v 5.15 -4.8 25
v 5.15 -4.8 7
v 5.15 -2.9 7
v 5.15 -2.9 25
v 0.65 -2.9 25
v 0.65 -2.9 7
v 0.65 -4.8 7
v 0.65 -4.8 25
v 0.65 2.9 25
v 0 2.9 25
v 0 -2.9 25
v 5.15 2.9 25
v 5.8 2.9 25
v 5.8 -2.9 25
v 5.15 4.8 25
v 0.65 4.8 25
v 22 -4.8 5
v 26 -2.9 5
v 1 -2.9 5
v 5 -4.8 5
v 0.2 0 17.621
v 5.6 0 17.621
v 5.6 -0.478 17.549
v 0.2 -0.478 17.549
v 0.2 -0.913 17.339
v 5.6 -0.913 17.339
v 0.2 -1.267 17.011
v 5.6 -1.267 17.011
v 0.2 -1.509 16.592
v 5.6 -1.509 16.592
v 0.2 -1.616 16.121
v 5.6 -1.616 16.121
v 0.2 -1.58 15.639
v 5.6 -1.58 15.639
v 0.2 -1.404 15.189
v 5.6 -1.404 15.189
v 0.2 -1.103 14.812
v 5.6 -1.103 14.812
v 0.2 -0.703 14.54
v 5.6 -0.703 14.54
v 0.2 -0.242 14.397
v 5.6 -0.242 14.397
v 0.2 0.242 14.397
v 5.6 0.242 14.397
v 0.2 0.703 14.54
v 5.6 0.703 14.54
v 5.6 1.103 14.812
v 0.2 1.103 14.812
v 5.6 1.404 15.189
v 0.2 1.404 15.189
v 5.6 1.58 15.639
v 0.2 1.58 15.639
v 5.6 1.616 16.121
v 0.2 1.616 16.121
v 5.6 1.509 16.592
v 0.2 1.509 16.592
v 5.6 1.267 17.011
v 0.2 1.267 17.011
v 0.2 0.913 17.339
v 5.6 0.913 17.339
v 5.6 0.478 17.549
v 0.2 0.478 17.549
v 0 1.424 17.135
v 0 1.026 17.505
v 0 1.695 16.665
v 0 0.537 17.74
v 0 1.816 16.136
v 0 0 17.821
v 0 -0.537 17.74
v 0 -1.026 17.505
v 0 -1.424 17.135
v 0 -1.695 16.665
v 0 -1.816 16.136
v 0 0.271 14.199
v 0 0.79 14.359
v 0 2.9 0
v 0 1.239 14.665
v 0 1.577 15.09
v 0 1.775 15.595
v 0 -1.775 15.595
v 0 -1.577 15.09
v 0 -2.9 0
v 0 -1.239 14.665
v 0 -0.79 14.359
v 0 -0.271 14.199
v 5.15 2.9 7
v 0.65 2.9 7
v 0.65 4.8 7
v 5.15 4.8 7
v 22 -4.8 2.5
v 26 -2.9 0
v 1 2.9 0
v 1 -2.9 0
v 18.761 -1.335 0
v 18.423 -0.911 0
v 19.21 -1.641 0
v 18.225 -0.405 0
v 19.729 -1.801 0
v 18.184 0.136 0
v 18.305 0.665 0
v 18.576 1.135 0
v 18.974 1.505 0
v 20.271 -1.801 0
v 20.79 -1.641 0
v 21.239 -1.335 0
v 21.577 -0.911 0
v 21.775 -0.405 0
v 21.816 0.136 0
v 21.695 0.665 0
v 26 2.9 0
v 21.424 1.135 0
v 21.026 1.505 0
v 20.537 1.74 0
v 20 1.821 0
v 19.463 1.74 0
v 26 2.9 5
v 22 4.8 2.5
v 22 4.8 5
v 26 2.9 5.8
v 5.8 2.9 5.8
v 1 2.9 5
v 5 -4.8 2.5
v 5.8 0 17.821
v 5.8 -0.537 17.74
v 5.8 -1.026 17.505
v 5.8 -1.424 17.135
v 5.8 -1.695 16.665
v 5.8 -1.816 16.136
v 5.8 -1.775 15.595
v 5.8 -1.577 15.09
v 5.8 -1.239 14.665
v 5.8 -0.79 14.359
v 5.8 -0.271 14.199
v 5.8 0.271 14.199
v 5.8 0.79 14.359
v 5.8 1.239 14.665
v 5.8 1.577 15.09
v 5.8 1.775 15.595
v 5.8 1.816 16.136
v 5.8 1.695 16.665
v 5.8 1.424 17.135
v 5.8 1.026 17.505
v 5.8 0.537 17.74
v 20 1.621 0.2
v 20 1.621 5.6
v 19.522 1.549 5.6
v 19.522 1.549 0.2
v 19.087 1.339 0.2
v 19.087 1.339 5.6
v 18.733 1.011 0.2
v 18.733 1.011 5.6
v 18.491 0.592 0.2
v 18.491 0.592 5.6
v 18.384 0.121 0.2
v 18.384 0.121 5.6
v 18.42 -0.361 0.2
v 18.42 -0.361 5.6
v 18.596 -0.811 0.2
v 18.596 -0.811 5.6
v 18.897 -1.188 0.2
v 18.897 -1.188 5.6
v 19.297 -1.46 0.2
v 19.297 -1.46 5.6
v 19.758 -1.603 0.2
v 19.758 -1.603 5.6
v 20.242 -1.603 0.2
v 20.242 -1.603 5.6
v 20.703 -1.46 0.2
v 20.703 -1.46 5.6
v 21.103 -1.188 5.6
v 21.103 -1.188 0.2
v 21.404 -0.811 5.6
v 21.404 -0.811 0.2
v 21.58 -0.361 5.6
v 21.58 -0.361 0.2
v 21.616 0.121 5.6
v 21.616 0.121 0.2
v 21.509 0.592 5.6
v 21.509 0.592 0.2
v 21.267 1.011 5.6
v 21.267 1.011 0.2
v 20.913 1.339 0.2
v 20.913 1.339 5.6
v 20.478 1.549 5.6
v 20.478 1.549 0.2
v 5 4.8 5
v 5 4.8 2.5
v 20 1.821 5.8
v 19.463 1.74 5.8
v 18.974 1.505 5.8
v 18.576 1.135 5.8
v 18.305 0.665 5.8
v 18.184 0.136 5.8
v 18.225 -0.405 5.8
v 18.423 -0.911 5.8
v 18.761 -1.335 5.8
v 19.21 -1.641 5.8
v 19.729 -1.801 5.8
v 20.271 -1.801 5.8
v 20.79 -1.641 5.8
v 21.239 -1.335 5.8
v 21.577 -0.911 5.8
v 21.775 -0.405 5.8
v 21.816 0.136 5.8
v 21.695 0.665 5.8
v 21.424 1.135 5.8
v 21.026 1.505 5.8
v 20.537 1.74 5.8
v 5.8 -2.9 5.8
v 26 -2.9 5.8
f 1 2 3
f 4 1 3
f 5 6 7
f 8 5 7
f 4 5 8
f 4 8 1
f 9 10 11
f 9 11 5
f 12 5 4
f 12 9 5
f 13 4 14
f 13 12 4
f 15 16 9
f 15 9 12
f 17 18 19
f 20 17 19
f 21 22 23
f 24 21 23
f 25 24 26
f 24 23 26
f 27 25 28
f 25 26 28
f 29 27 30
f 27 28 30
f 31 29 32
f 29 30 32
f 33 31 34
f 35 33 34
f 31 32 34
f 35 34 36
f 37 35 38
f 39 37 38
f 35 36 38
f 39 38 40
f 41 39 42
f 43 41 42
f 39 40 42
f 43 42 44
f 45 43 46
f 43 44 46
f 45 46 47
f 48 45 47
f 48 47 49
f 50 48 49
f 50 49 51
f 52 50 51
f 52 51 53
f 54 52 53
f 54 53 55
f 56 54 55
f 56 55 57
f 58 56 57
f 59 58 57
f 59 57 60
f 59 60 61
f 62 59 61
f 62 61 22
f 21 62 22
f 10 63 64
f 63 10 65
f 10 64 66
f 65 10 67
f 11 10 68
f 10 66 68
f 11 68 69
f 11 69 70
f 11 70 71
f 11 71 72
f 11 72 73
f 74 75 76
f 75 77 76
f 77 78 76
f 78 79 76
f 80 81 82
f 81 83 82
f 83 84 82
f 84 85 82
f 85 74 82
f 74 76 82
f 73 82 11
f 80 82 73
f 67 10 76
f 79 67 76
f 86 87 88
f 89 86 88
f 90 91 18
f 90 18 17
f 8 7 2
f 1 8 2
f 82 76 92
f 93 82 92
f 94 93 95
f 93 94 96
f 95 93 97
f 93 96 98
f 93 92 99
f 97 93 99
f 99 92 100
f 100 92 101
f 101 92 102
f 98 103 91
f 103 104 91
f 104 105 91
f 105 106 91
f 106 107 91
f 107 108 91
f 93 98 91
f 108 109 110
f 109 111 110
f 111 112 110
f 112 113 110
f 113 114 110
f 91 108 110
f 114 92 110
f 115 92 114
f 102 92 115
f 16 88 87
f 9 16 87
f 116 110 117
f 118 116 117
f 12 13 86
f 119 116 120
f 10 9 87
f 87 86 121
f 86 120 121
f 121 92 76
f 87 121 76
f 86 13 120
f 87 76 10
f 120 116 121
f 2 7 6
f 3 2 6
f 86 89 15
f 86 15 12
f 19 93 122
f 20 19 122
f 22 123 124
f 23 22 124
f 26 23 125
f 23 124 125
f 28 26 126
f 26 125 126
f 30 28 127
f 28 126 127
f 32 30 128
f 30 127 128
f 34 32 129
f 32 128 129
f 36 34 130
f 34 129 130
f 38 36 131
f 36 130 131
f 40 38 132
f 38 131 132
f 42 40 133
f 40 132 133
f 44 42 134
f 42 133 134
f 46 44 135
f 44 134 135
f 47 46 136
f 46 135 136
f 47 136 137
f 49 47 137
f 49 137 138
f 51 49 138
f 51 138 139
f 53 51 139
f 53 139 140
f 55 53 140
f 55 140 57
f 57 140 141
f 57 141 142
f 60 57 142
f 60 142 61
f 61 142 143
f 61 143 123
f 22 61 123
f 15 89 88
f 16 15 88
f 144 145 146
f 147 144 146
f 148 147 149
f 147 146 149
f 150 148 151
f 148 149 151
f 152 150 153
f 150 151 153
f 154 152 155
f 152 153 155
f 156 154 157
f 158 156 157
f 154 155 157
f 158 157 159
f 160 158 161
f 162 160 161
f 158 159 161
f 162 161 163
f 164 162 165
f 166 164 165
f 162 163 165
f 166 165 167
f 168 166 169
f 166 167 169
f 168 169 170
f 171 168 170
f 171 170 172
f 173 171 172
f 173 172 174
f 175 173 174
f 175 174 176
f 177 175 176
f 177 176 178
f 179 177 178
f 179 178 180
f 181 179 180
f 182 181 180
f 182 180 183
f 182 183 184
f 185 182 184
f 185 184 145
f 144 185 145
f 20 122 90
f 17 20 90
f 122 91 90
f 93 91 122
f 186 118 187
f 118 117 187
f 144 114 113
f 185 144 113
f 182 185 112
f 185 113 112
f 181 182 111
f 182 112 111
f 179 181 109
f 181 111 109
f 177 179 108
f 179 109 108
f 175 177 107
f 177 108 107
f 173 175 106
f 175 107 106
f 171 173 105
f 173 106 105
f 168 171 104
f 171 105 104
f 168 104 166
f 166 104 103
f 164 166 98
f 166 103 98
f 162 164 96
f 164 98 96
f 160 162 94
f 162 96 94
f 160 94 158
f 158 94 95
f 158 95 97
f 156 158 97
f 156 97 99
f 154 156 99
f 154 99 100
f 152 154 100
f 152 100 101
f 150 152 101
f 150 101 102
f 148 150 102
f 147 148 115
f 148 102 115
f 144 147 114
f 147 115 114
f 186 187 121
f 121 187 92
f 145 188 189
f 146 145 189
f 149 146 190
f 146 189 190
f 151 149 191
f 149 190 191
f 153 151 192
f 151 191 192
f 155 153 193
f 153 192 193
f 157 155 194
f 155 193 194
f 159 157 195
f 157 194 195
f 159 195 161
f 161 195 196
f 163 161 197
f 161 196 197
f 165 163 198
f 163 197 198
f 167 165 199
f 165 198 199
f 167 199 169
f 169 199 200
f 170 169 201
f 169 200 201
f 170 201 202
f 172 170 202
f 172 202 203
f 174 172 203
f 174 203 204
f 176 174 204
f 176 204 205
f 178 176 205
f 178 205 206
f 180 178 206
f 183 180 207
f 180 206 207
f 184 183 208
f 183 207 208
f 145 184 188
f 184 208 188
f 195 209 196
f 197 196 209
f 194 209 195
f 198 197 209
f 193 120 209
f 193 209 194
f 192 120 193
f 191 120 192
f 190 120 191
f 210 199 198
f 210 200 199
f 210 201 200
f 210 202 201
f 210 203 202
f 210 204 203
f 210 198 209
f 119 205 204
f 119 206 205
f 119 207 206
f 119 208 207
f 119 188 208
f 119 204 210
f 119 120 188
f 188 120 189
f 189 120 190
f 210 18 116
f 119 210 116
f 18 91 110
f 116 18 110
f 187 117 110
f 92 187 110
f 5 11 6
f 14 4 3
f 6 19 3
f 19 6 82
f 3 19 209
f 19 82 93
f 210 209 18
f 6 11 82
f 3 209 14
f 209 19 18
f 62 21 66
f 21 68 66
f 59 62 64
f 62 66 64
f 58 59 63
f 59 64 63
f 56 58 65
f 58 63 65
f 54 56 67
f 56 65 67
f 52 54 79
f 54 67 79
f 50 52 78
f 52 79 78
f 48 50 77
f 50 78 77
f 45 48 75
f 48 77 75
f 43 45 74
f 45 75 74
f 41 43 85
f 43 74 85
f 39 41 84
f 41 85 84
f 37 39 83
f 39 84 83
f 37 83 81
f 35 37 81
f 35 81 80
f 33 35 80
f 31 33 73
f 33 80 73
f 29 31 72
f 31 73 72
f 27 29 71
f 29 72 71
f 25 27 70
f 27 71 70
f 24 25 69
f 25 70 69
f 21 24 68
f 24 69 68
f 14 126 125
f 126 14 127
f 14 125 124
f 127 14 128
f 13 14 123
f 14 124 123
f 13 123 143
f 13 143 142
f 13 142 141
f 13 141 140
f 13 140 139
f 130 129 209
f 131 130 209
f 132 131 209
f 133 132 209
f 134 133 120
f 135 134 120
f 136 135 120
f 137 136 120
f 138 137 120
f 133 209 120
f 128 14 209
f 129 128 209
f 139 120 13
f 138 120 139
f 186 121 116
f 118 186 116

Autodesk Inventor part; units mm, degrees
ref_plane "YZ Plane" through (0, 0, 0) normal (1, 0, 0) x (0, 1, 0)
ref_plane "XZ Plane" through (0, 0, 0) normal (0, 1, 0) x (-1, 0, 0)
ref_plane "XY Plane" through (0, 0, 0) normal (0, 0, 1) x (1, 0, 0)
sketch "Skizze3" plane through (0, 0, 0) normal (1, 0, 0) x (0, 1, 0)
  line L0 (4.8, 5) -> (-4.8, 5)
  line L1 (2.9, 5) -> (2.9, 25)
  line L2 (2.9, 25) -> (-2.9, 25)
  line L3 (-2.9, 25) -> (-2.9, 5)
  line L4 (-2.9, 25) -> (-4.8, 25)
  line L5 (-4.8, 25) -> (-4.8, 7)
  line L6 (-4.8, 7) -> (-2.9, 7)
  line L7 (2.9, 7) -> (4.8, 7)
  line L8 (4.8, 7) -> (4.8, 25)
  line L9 (4.8, 25) -> (2.9, 25)
  line L10 (0, -5) -> (0, 30) projected
  line L11 (4.8, 5) -> (4.8, 2.5)
  line L12 (-2.9, 0) -> (-4.8, 2.5)
  line L13 (-4.8, 2.5) -> (-4.8, 5)
  line L14 (4.8, 2.5) -> (2.9, 0)
  line L15 (2.9, 0) -> (-2.9, 0)
  line L16 (-6.72, 0) -> (6.72, 0) projected
  line L17 (-2.9, 0) -> (-4.8, 0)
  line L18 (-4.8, 2.5) -> (-4.8, 0)
  line L19 (4.8, 2.5) -> (4.8, 0)
  line L20 (4.8, 0) -> (2.9, 0)
  line L21 (4.8, 5) -> (4.8, 7)
  line L22 (-4.8, 5) -> (-4.8, 7)
  point P0 (0, 0)
  point P1 (0, 25)
  point P2 (0, 5)
  point P3 (0, 0)
  point P4 (0, 16)
  dimension "d5" = 9.6
  dimension "d6" = 5.8
  dimension "d7" = 1.9
  dimension "d9" = 18
  dimension "d10" = 18
  dimension "d12" = 9.6
  dimension "d14" = 2.9
  dimension "d15" = 2.5
  dimension "d16" = 5.8
  dimension "d17" = 2.5
  dimension "d18" = 5
  dimension "d19" = 25
  dimension "d40" = 9
sketch "Skizze4" plane through (0, 0, 0) normal (0, 1, 0) x (-1, 0, 0)
  line L0 (0, 25) -> (0, 7) projected
  line L1 (0, 2.5) -> (0, 5) projected
  line L2 (0, 0) -> (0, 25)
  line L3 (0, 25) -> (-5.8, 25)
  line L4 (-5.8, 25) -> (-5.8, 5.8)
  line L5 (-5.8, 5.8) -> (-26, 5.8)
  line L6 (-26, 5.8) -> (-26, 0)
  line L7 (-26, 0) -> (0, 0)
  line L8 (-0.65, 25) -> (-0.65, 7)
  line L9 (-0.65, 7) -> (-5.15, 7)
  line L10 (-5.15, 7) -> (-5.15, 25)
  line L11 (-1, 0) -> (-1, 5)
  line L12 (-1, 5) -> (-26, 5)
  line L13 (-1, 0) -> (-5, 2.5)
  line L14 (-5, 2.5) -> (-22, 2.5)
  line L15 (-22, 2.5) -> (-26, 0)
  line L16 (-22, 2.5) -> (-22, 5)
  line L17 (-5, 2.5) -> (-5, 5)
  point P0 (0, 0)
  point P1 (0, 0)
  dimension "d20" = 5.8
  dimension "d21" = 4.5
  dimension "d22" = 0.65
  dimension "d23" = 26
  dimension "d24" = 5.8
  dimension "d25" = 25
  dimension "d26" = 4
  dimension "d27" = 4
sketch "Skizze5" plane through (0, 0, 0) normal (0, 0, 1) x (1, 0, 0)
  line L0 (5.15, 4.8) -> (0.65, 4.8)
  line L1 (0.65, 4.8) -> (0.65, 2.9)
  line L2 (0.65, 2.9) -> (0, 2.9)
  line L3 (0, 2.9) -> (0, -2.9)
  line L4 (0, -2.9) -> (0.65, -2.9)
  line L5 (0.65, -2.9) -> (0.65, -4.8)
  line L6 (0.65, -4.8) -> (5.15, -4.8)
  line L7 (5.15, -4.8) -> (5.15, -2.9)
  line L8 (5.15, -2.9) -> (5.8, -2.9)
  line L9 (5.8, -2.9) -> (5.8, 2.9)
  line L10 (5.8, 2.9) -> (5.15, 2.9)
  line L11 (5.15, 4.8) -> (5.15, 2.9)
  line L12 (0, -2.9) -> (26, -2.9)
  line L13 (26, -2.9) -> (26, 2.9)
  line L14 (26, 2.9) -> (0, 2.9)
  line L15 (26, -2.9) -> (22, -4.8)
  line L16 (22, -4.8) -> (5, -4.8)
  line L17 (1, -2.9) -> (5, -4.8)
  line L18 (22, -7.8717) -> (22, 8.228) construction
  line L19 (5, -6.3703) -> (5, 8.228) construction
  line L20 (1, -9.3021) -> (1, 6.7781) construction
  line L21 (26, 2.9) -> (22, 4.8)
  line L22 (5, 4.8) -> (1, 2.9)
  line L23 (5, 4.8) -> (22, 4.8)
  line L24 (26, 0) -> (0, 0) projected
  point P0 (5.8, 0)
  point P1 (5.15, 0)
  point P2 (0.65, 0)
  point P3 (0, 4.8)
  point P4 (0, -4.8)
  point P5 (1, 0)
  point P6 (1, 0)
  point P7 (1, 0)
  point P8 (5, 0)
  point P9 (5, 0)
  point P10 (5, 0)
  point P11 (22, 0)
  point P12 (22, 0)
  point P13 (22, 0)
  point P14 (26, 0)
  point P15 (26, 0)
  point P16 (20, 0)
  dimension "d41" = 6
extrude "Extrusion6" add sketch "Skizze5" along normal blind 25 contours L11 L14 L22 L0 | L22 L14 L1 L0 | L10 L9 L24 L3 L2 L14 | L9 L8 L12 L4 L3 L24 | L7 L6 L17 L12 | L17 L6 L5 L12
extrude "Extrusion7" cut sketch "Skizze3" along normal through all contours L0 L1 L7 L21 | L0 L22 L6 L3
extrude "Extrusion3" add sketch "Skizze5" along normal blind 5 separate body contours L11 L14 L22 L0 | L23 L21 L14 L10 L11 | L10 L9 L24 L3 L2 L14 | L14 L13 L24 L9 | L24 L13 L12 L9 | L9 L8 L12 L4 L3 L24 | L12 L15 L16 L7 L8 | L7 L6 L17 L12
extrude "Extrusion5" add sketch "Skizze5" along normal blind 5.8 contours L14 L13 L24 L9 | L24 L13 L12 L9
extrude "Extrusion4" cut sketch "Skizze3" along normal through all contours L19 L16 L14 | L16 L18 L12
extrude "Extrusion8" cut sketch "Skizze5" along normal up to surface (5 mm away) contours L22 L14 L1 L0 | L17 L6 L5 L12
hole "Bohrung1" at (20, 0, 0) direction (0, 0, 1) diameter 3.242 end through all thread size "M4x0.7" class "6H" standard "ISO Metric profile"
hole "Bohrung2" at (0, 0, 16) direction (1, 0, 0) diameter 3.242 end through all thread size "M4x0.7" class "6H" standard "ISO Metric profile"
chamfer "Fase1" distance 0.2 angle 45 4 edges at (0, 0, 14.379) (5.8, 0, 14.379) (20, -1.621, 5.8) (20, -1.621, 0)
equation "\"d5\" = H2"
equation "\"d6\" = H1"
equation "\"d7\" = -0.5 * d6 + 0.5 * d5"
equation "\"d12\" = d5"
equation "\"d14\" = 0.5 * d16"
equation "\"d19\" = L2"
equation "\"d20\" = G2"
equation "\"d21\" = G1"
equation "\"d22\" = -0.5 * d21 + 0.5 * d20"
equation "\"d23\" = L1"
equation "\"d24\" = G2"
equation "\"d34\" = L2"
equation "\"d32\" = d24"
equation "\"d38\" = L2"
equation "\"L1\" = 26"
equation "\"L2\" = 25"
equation "\"H1\" = 5.8"
equation "\"H2\" = 9.6"
equation "\"G1\" = 4.5"
equation "\"G2\" = 5.8"
equation "\"M\" = 4"
properties part number "BT000_trajan20_21"
